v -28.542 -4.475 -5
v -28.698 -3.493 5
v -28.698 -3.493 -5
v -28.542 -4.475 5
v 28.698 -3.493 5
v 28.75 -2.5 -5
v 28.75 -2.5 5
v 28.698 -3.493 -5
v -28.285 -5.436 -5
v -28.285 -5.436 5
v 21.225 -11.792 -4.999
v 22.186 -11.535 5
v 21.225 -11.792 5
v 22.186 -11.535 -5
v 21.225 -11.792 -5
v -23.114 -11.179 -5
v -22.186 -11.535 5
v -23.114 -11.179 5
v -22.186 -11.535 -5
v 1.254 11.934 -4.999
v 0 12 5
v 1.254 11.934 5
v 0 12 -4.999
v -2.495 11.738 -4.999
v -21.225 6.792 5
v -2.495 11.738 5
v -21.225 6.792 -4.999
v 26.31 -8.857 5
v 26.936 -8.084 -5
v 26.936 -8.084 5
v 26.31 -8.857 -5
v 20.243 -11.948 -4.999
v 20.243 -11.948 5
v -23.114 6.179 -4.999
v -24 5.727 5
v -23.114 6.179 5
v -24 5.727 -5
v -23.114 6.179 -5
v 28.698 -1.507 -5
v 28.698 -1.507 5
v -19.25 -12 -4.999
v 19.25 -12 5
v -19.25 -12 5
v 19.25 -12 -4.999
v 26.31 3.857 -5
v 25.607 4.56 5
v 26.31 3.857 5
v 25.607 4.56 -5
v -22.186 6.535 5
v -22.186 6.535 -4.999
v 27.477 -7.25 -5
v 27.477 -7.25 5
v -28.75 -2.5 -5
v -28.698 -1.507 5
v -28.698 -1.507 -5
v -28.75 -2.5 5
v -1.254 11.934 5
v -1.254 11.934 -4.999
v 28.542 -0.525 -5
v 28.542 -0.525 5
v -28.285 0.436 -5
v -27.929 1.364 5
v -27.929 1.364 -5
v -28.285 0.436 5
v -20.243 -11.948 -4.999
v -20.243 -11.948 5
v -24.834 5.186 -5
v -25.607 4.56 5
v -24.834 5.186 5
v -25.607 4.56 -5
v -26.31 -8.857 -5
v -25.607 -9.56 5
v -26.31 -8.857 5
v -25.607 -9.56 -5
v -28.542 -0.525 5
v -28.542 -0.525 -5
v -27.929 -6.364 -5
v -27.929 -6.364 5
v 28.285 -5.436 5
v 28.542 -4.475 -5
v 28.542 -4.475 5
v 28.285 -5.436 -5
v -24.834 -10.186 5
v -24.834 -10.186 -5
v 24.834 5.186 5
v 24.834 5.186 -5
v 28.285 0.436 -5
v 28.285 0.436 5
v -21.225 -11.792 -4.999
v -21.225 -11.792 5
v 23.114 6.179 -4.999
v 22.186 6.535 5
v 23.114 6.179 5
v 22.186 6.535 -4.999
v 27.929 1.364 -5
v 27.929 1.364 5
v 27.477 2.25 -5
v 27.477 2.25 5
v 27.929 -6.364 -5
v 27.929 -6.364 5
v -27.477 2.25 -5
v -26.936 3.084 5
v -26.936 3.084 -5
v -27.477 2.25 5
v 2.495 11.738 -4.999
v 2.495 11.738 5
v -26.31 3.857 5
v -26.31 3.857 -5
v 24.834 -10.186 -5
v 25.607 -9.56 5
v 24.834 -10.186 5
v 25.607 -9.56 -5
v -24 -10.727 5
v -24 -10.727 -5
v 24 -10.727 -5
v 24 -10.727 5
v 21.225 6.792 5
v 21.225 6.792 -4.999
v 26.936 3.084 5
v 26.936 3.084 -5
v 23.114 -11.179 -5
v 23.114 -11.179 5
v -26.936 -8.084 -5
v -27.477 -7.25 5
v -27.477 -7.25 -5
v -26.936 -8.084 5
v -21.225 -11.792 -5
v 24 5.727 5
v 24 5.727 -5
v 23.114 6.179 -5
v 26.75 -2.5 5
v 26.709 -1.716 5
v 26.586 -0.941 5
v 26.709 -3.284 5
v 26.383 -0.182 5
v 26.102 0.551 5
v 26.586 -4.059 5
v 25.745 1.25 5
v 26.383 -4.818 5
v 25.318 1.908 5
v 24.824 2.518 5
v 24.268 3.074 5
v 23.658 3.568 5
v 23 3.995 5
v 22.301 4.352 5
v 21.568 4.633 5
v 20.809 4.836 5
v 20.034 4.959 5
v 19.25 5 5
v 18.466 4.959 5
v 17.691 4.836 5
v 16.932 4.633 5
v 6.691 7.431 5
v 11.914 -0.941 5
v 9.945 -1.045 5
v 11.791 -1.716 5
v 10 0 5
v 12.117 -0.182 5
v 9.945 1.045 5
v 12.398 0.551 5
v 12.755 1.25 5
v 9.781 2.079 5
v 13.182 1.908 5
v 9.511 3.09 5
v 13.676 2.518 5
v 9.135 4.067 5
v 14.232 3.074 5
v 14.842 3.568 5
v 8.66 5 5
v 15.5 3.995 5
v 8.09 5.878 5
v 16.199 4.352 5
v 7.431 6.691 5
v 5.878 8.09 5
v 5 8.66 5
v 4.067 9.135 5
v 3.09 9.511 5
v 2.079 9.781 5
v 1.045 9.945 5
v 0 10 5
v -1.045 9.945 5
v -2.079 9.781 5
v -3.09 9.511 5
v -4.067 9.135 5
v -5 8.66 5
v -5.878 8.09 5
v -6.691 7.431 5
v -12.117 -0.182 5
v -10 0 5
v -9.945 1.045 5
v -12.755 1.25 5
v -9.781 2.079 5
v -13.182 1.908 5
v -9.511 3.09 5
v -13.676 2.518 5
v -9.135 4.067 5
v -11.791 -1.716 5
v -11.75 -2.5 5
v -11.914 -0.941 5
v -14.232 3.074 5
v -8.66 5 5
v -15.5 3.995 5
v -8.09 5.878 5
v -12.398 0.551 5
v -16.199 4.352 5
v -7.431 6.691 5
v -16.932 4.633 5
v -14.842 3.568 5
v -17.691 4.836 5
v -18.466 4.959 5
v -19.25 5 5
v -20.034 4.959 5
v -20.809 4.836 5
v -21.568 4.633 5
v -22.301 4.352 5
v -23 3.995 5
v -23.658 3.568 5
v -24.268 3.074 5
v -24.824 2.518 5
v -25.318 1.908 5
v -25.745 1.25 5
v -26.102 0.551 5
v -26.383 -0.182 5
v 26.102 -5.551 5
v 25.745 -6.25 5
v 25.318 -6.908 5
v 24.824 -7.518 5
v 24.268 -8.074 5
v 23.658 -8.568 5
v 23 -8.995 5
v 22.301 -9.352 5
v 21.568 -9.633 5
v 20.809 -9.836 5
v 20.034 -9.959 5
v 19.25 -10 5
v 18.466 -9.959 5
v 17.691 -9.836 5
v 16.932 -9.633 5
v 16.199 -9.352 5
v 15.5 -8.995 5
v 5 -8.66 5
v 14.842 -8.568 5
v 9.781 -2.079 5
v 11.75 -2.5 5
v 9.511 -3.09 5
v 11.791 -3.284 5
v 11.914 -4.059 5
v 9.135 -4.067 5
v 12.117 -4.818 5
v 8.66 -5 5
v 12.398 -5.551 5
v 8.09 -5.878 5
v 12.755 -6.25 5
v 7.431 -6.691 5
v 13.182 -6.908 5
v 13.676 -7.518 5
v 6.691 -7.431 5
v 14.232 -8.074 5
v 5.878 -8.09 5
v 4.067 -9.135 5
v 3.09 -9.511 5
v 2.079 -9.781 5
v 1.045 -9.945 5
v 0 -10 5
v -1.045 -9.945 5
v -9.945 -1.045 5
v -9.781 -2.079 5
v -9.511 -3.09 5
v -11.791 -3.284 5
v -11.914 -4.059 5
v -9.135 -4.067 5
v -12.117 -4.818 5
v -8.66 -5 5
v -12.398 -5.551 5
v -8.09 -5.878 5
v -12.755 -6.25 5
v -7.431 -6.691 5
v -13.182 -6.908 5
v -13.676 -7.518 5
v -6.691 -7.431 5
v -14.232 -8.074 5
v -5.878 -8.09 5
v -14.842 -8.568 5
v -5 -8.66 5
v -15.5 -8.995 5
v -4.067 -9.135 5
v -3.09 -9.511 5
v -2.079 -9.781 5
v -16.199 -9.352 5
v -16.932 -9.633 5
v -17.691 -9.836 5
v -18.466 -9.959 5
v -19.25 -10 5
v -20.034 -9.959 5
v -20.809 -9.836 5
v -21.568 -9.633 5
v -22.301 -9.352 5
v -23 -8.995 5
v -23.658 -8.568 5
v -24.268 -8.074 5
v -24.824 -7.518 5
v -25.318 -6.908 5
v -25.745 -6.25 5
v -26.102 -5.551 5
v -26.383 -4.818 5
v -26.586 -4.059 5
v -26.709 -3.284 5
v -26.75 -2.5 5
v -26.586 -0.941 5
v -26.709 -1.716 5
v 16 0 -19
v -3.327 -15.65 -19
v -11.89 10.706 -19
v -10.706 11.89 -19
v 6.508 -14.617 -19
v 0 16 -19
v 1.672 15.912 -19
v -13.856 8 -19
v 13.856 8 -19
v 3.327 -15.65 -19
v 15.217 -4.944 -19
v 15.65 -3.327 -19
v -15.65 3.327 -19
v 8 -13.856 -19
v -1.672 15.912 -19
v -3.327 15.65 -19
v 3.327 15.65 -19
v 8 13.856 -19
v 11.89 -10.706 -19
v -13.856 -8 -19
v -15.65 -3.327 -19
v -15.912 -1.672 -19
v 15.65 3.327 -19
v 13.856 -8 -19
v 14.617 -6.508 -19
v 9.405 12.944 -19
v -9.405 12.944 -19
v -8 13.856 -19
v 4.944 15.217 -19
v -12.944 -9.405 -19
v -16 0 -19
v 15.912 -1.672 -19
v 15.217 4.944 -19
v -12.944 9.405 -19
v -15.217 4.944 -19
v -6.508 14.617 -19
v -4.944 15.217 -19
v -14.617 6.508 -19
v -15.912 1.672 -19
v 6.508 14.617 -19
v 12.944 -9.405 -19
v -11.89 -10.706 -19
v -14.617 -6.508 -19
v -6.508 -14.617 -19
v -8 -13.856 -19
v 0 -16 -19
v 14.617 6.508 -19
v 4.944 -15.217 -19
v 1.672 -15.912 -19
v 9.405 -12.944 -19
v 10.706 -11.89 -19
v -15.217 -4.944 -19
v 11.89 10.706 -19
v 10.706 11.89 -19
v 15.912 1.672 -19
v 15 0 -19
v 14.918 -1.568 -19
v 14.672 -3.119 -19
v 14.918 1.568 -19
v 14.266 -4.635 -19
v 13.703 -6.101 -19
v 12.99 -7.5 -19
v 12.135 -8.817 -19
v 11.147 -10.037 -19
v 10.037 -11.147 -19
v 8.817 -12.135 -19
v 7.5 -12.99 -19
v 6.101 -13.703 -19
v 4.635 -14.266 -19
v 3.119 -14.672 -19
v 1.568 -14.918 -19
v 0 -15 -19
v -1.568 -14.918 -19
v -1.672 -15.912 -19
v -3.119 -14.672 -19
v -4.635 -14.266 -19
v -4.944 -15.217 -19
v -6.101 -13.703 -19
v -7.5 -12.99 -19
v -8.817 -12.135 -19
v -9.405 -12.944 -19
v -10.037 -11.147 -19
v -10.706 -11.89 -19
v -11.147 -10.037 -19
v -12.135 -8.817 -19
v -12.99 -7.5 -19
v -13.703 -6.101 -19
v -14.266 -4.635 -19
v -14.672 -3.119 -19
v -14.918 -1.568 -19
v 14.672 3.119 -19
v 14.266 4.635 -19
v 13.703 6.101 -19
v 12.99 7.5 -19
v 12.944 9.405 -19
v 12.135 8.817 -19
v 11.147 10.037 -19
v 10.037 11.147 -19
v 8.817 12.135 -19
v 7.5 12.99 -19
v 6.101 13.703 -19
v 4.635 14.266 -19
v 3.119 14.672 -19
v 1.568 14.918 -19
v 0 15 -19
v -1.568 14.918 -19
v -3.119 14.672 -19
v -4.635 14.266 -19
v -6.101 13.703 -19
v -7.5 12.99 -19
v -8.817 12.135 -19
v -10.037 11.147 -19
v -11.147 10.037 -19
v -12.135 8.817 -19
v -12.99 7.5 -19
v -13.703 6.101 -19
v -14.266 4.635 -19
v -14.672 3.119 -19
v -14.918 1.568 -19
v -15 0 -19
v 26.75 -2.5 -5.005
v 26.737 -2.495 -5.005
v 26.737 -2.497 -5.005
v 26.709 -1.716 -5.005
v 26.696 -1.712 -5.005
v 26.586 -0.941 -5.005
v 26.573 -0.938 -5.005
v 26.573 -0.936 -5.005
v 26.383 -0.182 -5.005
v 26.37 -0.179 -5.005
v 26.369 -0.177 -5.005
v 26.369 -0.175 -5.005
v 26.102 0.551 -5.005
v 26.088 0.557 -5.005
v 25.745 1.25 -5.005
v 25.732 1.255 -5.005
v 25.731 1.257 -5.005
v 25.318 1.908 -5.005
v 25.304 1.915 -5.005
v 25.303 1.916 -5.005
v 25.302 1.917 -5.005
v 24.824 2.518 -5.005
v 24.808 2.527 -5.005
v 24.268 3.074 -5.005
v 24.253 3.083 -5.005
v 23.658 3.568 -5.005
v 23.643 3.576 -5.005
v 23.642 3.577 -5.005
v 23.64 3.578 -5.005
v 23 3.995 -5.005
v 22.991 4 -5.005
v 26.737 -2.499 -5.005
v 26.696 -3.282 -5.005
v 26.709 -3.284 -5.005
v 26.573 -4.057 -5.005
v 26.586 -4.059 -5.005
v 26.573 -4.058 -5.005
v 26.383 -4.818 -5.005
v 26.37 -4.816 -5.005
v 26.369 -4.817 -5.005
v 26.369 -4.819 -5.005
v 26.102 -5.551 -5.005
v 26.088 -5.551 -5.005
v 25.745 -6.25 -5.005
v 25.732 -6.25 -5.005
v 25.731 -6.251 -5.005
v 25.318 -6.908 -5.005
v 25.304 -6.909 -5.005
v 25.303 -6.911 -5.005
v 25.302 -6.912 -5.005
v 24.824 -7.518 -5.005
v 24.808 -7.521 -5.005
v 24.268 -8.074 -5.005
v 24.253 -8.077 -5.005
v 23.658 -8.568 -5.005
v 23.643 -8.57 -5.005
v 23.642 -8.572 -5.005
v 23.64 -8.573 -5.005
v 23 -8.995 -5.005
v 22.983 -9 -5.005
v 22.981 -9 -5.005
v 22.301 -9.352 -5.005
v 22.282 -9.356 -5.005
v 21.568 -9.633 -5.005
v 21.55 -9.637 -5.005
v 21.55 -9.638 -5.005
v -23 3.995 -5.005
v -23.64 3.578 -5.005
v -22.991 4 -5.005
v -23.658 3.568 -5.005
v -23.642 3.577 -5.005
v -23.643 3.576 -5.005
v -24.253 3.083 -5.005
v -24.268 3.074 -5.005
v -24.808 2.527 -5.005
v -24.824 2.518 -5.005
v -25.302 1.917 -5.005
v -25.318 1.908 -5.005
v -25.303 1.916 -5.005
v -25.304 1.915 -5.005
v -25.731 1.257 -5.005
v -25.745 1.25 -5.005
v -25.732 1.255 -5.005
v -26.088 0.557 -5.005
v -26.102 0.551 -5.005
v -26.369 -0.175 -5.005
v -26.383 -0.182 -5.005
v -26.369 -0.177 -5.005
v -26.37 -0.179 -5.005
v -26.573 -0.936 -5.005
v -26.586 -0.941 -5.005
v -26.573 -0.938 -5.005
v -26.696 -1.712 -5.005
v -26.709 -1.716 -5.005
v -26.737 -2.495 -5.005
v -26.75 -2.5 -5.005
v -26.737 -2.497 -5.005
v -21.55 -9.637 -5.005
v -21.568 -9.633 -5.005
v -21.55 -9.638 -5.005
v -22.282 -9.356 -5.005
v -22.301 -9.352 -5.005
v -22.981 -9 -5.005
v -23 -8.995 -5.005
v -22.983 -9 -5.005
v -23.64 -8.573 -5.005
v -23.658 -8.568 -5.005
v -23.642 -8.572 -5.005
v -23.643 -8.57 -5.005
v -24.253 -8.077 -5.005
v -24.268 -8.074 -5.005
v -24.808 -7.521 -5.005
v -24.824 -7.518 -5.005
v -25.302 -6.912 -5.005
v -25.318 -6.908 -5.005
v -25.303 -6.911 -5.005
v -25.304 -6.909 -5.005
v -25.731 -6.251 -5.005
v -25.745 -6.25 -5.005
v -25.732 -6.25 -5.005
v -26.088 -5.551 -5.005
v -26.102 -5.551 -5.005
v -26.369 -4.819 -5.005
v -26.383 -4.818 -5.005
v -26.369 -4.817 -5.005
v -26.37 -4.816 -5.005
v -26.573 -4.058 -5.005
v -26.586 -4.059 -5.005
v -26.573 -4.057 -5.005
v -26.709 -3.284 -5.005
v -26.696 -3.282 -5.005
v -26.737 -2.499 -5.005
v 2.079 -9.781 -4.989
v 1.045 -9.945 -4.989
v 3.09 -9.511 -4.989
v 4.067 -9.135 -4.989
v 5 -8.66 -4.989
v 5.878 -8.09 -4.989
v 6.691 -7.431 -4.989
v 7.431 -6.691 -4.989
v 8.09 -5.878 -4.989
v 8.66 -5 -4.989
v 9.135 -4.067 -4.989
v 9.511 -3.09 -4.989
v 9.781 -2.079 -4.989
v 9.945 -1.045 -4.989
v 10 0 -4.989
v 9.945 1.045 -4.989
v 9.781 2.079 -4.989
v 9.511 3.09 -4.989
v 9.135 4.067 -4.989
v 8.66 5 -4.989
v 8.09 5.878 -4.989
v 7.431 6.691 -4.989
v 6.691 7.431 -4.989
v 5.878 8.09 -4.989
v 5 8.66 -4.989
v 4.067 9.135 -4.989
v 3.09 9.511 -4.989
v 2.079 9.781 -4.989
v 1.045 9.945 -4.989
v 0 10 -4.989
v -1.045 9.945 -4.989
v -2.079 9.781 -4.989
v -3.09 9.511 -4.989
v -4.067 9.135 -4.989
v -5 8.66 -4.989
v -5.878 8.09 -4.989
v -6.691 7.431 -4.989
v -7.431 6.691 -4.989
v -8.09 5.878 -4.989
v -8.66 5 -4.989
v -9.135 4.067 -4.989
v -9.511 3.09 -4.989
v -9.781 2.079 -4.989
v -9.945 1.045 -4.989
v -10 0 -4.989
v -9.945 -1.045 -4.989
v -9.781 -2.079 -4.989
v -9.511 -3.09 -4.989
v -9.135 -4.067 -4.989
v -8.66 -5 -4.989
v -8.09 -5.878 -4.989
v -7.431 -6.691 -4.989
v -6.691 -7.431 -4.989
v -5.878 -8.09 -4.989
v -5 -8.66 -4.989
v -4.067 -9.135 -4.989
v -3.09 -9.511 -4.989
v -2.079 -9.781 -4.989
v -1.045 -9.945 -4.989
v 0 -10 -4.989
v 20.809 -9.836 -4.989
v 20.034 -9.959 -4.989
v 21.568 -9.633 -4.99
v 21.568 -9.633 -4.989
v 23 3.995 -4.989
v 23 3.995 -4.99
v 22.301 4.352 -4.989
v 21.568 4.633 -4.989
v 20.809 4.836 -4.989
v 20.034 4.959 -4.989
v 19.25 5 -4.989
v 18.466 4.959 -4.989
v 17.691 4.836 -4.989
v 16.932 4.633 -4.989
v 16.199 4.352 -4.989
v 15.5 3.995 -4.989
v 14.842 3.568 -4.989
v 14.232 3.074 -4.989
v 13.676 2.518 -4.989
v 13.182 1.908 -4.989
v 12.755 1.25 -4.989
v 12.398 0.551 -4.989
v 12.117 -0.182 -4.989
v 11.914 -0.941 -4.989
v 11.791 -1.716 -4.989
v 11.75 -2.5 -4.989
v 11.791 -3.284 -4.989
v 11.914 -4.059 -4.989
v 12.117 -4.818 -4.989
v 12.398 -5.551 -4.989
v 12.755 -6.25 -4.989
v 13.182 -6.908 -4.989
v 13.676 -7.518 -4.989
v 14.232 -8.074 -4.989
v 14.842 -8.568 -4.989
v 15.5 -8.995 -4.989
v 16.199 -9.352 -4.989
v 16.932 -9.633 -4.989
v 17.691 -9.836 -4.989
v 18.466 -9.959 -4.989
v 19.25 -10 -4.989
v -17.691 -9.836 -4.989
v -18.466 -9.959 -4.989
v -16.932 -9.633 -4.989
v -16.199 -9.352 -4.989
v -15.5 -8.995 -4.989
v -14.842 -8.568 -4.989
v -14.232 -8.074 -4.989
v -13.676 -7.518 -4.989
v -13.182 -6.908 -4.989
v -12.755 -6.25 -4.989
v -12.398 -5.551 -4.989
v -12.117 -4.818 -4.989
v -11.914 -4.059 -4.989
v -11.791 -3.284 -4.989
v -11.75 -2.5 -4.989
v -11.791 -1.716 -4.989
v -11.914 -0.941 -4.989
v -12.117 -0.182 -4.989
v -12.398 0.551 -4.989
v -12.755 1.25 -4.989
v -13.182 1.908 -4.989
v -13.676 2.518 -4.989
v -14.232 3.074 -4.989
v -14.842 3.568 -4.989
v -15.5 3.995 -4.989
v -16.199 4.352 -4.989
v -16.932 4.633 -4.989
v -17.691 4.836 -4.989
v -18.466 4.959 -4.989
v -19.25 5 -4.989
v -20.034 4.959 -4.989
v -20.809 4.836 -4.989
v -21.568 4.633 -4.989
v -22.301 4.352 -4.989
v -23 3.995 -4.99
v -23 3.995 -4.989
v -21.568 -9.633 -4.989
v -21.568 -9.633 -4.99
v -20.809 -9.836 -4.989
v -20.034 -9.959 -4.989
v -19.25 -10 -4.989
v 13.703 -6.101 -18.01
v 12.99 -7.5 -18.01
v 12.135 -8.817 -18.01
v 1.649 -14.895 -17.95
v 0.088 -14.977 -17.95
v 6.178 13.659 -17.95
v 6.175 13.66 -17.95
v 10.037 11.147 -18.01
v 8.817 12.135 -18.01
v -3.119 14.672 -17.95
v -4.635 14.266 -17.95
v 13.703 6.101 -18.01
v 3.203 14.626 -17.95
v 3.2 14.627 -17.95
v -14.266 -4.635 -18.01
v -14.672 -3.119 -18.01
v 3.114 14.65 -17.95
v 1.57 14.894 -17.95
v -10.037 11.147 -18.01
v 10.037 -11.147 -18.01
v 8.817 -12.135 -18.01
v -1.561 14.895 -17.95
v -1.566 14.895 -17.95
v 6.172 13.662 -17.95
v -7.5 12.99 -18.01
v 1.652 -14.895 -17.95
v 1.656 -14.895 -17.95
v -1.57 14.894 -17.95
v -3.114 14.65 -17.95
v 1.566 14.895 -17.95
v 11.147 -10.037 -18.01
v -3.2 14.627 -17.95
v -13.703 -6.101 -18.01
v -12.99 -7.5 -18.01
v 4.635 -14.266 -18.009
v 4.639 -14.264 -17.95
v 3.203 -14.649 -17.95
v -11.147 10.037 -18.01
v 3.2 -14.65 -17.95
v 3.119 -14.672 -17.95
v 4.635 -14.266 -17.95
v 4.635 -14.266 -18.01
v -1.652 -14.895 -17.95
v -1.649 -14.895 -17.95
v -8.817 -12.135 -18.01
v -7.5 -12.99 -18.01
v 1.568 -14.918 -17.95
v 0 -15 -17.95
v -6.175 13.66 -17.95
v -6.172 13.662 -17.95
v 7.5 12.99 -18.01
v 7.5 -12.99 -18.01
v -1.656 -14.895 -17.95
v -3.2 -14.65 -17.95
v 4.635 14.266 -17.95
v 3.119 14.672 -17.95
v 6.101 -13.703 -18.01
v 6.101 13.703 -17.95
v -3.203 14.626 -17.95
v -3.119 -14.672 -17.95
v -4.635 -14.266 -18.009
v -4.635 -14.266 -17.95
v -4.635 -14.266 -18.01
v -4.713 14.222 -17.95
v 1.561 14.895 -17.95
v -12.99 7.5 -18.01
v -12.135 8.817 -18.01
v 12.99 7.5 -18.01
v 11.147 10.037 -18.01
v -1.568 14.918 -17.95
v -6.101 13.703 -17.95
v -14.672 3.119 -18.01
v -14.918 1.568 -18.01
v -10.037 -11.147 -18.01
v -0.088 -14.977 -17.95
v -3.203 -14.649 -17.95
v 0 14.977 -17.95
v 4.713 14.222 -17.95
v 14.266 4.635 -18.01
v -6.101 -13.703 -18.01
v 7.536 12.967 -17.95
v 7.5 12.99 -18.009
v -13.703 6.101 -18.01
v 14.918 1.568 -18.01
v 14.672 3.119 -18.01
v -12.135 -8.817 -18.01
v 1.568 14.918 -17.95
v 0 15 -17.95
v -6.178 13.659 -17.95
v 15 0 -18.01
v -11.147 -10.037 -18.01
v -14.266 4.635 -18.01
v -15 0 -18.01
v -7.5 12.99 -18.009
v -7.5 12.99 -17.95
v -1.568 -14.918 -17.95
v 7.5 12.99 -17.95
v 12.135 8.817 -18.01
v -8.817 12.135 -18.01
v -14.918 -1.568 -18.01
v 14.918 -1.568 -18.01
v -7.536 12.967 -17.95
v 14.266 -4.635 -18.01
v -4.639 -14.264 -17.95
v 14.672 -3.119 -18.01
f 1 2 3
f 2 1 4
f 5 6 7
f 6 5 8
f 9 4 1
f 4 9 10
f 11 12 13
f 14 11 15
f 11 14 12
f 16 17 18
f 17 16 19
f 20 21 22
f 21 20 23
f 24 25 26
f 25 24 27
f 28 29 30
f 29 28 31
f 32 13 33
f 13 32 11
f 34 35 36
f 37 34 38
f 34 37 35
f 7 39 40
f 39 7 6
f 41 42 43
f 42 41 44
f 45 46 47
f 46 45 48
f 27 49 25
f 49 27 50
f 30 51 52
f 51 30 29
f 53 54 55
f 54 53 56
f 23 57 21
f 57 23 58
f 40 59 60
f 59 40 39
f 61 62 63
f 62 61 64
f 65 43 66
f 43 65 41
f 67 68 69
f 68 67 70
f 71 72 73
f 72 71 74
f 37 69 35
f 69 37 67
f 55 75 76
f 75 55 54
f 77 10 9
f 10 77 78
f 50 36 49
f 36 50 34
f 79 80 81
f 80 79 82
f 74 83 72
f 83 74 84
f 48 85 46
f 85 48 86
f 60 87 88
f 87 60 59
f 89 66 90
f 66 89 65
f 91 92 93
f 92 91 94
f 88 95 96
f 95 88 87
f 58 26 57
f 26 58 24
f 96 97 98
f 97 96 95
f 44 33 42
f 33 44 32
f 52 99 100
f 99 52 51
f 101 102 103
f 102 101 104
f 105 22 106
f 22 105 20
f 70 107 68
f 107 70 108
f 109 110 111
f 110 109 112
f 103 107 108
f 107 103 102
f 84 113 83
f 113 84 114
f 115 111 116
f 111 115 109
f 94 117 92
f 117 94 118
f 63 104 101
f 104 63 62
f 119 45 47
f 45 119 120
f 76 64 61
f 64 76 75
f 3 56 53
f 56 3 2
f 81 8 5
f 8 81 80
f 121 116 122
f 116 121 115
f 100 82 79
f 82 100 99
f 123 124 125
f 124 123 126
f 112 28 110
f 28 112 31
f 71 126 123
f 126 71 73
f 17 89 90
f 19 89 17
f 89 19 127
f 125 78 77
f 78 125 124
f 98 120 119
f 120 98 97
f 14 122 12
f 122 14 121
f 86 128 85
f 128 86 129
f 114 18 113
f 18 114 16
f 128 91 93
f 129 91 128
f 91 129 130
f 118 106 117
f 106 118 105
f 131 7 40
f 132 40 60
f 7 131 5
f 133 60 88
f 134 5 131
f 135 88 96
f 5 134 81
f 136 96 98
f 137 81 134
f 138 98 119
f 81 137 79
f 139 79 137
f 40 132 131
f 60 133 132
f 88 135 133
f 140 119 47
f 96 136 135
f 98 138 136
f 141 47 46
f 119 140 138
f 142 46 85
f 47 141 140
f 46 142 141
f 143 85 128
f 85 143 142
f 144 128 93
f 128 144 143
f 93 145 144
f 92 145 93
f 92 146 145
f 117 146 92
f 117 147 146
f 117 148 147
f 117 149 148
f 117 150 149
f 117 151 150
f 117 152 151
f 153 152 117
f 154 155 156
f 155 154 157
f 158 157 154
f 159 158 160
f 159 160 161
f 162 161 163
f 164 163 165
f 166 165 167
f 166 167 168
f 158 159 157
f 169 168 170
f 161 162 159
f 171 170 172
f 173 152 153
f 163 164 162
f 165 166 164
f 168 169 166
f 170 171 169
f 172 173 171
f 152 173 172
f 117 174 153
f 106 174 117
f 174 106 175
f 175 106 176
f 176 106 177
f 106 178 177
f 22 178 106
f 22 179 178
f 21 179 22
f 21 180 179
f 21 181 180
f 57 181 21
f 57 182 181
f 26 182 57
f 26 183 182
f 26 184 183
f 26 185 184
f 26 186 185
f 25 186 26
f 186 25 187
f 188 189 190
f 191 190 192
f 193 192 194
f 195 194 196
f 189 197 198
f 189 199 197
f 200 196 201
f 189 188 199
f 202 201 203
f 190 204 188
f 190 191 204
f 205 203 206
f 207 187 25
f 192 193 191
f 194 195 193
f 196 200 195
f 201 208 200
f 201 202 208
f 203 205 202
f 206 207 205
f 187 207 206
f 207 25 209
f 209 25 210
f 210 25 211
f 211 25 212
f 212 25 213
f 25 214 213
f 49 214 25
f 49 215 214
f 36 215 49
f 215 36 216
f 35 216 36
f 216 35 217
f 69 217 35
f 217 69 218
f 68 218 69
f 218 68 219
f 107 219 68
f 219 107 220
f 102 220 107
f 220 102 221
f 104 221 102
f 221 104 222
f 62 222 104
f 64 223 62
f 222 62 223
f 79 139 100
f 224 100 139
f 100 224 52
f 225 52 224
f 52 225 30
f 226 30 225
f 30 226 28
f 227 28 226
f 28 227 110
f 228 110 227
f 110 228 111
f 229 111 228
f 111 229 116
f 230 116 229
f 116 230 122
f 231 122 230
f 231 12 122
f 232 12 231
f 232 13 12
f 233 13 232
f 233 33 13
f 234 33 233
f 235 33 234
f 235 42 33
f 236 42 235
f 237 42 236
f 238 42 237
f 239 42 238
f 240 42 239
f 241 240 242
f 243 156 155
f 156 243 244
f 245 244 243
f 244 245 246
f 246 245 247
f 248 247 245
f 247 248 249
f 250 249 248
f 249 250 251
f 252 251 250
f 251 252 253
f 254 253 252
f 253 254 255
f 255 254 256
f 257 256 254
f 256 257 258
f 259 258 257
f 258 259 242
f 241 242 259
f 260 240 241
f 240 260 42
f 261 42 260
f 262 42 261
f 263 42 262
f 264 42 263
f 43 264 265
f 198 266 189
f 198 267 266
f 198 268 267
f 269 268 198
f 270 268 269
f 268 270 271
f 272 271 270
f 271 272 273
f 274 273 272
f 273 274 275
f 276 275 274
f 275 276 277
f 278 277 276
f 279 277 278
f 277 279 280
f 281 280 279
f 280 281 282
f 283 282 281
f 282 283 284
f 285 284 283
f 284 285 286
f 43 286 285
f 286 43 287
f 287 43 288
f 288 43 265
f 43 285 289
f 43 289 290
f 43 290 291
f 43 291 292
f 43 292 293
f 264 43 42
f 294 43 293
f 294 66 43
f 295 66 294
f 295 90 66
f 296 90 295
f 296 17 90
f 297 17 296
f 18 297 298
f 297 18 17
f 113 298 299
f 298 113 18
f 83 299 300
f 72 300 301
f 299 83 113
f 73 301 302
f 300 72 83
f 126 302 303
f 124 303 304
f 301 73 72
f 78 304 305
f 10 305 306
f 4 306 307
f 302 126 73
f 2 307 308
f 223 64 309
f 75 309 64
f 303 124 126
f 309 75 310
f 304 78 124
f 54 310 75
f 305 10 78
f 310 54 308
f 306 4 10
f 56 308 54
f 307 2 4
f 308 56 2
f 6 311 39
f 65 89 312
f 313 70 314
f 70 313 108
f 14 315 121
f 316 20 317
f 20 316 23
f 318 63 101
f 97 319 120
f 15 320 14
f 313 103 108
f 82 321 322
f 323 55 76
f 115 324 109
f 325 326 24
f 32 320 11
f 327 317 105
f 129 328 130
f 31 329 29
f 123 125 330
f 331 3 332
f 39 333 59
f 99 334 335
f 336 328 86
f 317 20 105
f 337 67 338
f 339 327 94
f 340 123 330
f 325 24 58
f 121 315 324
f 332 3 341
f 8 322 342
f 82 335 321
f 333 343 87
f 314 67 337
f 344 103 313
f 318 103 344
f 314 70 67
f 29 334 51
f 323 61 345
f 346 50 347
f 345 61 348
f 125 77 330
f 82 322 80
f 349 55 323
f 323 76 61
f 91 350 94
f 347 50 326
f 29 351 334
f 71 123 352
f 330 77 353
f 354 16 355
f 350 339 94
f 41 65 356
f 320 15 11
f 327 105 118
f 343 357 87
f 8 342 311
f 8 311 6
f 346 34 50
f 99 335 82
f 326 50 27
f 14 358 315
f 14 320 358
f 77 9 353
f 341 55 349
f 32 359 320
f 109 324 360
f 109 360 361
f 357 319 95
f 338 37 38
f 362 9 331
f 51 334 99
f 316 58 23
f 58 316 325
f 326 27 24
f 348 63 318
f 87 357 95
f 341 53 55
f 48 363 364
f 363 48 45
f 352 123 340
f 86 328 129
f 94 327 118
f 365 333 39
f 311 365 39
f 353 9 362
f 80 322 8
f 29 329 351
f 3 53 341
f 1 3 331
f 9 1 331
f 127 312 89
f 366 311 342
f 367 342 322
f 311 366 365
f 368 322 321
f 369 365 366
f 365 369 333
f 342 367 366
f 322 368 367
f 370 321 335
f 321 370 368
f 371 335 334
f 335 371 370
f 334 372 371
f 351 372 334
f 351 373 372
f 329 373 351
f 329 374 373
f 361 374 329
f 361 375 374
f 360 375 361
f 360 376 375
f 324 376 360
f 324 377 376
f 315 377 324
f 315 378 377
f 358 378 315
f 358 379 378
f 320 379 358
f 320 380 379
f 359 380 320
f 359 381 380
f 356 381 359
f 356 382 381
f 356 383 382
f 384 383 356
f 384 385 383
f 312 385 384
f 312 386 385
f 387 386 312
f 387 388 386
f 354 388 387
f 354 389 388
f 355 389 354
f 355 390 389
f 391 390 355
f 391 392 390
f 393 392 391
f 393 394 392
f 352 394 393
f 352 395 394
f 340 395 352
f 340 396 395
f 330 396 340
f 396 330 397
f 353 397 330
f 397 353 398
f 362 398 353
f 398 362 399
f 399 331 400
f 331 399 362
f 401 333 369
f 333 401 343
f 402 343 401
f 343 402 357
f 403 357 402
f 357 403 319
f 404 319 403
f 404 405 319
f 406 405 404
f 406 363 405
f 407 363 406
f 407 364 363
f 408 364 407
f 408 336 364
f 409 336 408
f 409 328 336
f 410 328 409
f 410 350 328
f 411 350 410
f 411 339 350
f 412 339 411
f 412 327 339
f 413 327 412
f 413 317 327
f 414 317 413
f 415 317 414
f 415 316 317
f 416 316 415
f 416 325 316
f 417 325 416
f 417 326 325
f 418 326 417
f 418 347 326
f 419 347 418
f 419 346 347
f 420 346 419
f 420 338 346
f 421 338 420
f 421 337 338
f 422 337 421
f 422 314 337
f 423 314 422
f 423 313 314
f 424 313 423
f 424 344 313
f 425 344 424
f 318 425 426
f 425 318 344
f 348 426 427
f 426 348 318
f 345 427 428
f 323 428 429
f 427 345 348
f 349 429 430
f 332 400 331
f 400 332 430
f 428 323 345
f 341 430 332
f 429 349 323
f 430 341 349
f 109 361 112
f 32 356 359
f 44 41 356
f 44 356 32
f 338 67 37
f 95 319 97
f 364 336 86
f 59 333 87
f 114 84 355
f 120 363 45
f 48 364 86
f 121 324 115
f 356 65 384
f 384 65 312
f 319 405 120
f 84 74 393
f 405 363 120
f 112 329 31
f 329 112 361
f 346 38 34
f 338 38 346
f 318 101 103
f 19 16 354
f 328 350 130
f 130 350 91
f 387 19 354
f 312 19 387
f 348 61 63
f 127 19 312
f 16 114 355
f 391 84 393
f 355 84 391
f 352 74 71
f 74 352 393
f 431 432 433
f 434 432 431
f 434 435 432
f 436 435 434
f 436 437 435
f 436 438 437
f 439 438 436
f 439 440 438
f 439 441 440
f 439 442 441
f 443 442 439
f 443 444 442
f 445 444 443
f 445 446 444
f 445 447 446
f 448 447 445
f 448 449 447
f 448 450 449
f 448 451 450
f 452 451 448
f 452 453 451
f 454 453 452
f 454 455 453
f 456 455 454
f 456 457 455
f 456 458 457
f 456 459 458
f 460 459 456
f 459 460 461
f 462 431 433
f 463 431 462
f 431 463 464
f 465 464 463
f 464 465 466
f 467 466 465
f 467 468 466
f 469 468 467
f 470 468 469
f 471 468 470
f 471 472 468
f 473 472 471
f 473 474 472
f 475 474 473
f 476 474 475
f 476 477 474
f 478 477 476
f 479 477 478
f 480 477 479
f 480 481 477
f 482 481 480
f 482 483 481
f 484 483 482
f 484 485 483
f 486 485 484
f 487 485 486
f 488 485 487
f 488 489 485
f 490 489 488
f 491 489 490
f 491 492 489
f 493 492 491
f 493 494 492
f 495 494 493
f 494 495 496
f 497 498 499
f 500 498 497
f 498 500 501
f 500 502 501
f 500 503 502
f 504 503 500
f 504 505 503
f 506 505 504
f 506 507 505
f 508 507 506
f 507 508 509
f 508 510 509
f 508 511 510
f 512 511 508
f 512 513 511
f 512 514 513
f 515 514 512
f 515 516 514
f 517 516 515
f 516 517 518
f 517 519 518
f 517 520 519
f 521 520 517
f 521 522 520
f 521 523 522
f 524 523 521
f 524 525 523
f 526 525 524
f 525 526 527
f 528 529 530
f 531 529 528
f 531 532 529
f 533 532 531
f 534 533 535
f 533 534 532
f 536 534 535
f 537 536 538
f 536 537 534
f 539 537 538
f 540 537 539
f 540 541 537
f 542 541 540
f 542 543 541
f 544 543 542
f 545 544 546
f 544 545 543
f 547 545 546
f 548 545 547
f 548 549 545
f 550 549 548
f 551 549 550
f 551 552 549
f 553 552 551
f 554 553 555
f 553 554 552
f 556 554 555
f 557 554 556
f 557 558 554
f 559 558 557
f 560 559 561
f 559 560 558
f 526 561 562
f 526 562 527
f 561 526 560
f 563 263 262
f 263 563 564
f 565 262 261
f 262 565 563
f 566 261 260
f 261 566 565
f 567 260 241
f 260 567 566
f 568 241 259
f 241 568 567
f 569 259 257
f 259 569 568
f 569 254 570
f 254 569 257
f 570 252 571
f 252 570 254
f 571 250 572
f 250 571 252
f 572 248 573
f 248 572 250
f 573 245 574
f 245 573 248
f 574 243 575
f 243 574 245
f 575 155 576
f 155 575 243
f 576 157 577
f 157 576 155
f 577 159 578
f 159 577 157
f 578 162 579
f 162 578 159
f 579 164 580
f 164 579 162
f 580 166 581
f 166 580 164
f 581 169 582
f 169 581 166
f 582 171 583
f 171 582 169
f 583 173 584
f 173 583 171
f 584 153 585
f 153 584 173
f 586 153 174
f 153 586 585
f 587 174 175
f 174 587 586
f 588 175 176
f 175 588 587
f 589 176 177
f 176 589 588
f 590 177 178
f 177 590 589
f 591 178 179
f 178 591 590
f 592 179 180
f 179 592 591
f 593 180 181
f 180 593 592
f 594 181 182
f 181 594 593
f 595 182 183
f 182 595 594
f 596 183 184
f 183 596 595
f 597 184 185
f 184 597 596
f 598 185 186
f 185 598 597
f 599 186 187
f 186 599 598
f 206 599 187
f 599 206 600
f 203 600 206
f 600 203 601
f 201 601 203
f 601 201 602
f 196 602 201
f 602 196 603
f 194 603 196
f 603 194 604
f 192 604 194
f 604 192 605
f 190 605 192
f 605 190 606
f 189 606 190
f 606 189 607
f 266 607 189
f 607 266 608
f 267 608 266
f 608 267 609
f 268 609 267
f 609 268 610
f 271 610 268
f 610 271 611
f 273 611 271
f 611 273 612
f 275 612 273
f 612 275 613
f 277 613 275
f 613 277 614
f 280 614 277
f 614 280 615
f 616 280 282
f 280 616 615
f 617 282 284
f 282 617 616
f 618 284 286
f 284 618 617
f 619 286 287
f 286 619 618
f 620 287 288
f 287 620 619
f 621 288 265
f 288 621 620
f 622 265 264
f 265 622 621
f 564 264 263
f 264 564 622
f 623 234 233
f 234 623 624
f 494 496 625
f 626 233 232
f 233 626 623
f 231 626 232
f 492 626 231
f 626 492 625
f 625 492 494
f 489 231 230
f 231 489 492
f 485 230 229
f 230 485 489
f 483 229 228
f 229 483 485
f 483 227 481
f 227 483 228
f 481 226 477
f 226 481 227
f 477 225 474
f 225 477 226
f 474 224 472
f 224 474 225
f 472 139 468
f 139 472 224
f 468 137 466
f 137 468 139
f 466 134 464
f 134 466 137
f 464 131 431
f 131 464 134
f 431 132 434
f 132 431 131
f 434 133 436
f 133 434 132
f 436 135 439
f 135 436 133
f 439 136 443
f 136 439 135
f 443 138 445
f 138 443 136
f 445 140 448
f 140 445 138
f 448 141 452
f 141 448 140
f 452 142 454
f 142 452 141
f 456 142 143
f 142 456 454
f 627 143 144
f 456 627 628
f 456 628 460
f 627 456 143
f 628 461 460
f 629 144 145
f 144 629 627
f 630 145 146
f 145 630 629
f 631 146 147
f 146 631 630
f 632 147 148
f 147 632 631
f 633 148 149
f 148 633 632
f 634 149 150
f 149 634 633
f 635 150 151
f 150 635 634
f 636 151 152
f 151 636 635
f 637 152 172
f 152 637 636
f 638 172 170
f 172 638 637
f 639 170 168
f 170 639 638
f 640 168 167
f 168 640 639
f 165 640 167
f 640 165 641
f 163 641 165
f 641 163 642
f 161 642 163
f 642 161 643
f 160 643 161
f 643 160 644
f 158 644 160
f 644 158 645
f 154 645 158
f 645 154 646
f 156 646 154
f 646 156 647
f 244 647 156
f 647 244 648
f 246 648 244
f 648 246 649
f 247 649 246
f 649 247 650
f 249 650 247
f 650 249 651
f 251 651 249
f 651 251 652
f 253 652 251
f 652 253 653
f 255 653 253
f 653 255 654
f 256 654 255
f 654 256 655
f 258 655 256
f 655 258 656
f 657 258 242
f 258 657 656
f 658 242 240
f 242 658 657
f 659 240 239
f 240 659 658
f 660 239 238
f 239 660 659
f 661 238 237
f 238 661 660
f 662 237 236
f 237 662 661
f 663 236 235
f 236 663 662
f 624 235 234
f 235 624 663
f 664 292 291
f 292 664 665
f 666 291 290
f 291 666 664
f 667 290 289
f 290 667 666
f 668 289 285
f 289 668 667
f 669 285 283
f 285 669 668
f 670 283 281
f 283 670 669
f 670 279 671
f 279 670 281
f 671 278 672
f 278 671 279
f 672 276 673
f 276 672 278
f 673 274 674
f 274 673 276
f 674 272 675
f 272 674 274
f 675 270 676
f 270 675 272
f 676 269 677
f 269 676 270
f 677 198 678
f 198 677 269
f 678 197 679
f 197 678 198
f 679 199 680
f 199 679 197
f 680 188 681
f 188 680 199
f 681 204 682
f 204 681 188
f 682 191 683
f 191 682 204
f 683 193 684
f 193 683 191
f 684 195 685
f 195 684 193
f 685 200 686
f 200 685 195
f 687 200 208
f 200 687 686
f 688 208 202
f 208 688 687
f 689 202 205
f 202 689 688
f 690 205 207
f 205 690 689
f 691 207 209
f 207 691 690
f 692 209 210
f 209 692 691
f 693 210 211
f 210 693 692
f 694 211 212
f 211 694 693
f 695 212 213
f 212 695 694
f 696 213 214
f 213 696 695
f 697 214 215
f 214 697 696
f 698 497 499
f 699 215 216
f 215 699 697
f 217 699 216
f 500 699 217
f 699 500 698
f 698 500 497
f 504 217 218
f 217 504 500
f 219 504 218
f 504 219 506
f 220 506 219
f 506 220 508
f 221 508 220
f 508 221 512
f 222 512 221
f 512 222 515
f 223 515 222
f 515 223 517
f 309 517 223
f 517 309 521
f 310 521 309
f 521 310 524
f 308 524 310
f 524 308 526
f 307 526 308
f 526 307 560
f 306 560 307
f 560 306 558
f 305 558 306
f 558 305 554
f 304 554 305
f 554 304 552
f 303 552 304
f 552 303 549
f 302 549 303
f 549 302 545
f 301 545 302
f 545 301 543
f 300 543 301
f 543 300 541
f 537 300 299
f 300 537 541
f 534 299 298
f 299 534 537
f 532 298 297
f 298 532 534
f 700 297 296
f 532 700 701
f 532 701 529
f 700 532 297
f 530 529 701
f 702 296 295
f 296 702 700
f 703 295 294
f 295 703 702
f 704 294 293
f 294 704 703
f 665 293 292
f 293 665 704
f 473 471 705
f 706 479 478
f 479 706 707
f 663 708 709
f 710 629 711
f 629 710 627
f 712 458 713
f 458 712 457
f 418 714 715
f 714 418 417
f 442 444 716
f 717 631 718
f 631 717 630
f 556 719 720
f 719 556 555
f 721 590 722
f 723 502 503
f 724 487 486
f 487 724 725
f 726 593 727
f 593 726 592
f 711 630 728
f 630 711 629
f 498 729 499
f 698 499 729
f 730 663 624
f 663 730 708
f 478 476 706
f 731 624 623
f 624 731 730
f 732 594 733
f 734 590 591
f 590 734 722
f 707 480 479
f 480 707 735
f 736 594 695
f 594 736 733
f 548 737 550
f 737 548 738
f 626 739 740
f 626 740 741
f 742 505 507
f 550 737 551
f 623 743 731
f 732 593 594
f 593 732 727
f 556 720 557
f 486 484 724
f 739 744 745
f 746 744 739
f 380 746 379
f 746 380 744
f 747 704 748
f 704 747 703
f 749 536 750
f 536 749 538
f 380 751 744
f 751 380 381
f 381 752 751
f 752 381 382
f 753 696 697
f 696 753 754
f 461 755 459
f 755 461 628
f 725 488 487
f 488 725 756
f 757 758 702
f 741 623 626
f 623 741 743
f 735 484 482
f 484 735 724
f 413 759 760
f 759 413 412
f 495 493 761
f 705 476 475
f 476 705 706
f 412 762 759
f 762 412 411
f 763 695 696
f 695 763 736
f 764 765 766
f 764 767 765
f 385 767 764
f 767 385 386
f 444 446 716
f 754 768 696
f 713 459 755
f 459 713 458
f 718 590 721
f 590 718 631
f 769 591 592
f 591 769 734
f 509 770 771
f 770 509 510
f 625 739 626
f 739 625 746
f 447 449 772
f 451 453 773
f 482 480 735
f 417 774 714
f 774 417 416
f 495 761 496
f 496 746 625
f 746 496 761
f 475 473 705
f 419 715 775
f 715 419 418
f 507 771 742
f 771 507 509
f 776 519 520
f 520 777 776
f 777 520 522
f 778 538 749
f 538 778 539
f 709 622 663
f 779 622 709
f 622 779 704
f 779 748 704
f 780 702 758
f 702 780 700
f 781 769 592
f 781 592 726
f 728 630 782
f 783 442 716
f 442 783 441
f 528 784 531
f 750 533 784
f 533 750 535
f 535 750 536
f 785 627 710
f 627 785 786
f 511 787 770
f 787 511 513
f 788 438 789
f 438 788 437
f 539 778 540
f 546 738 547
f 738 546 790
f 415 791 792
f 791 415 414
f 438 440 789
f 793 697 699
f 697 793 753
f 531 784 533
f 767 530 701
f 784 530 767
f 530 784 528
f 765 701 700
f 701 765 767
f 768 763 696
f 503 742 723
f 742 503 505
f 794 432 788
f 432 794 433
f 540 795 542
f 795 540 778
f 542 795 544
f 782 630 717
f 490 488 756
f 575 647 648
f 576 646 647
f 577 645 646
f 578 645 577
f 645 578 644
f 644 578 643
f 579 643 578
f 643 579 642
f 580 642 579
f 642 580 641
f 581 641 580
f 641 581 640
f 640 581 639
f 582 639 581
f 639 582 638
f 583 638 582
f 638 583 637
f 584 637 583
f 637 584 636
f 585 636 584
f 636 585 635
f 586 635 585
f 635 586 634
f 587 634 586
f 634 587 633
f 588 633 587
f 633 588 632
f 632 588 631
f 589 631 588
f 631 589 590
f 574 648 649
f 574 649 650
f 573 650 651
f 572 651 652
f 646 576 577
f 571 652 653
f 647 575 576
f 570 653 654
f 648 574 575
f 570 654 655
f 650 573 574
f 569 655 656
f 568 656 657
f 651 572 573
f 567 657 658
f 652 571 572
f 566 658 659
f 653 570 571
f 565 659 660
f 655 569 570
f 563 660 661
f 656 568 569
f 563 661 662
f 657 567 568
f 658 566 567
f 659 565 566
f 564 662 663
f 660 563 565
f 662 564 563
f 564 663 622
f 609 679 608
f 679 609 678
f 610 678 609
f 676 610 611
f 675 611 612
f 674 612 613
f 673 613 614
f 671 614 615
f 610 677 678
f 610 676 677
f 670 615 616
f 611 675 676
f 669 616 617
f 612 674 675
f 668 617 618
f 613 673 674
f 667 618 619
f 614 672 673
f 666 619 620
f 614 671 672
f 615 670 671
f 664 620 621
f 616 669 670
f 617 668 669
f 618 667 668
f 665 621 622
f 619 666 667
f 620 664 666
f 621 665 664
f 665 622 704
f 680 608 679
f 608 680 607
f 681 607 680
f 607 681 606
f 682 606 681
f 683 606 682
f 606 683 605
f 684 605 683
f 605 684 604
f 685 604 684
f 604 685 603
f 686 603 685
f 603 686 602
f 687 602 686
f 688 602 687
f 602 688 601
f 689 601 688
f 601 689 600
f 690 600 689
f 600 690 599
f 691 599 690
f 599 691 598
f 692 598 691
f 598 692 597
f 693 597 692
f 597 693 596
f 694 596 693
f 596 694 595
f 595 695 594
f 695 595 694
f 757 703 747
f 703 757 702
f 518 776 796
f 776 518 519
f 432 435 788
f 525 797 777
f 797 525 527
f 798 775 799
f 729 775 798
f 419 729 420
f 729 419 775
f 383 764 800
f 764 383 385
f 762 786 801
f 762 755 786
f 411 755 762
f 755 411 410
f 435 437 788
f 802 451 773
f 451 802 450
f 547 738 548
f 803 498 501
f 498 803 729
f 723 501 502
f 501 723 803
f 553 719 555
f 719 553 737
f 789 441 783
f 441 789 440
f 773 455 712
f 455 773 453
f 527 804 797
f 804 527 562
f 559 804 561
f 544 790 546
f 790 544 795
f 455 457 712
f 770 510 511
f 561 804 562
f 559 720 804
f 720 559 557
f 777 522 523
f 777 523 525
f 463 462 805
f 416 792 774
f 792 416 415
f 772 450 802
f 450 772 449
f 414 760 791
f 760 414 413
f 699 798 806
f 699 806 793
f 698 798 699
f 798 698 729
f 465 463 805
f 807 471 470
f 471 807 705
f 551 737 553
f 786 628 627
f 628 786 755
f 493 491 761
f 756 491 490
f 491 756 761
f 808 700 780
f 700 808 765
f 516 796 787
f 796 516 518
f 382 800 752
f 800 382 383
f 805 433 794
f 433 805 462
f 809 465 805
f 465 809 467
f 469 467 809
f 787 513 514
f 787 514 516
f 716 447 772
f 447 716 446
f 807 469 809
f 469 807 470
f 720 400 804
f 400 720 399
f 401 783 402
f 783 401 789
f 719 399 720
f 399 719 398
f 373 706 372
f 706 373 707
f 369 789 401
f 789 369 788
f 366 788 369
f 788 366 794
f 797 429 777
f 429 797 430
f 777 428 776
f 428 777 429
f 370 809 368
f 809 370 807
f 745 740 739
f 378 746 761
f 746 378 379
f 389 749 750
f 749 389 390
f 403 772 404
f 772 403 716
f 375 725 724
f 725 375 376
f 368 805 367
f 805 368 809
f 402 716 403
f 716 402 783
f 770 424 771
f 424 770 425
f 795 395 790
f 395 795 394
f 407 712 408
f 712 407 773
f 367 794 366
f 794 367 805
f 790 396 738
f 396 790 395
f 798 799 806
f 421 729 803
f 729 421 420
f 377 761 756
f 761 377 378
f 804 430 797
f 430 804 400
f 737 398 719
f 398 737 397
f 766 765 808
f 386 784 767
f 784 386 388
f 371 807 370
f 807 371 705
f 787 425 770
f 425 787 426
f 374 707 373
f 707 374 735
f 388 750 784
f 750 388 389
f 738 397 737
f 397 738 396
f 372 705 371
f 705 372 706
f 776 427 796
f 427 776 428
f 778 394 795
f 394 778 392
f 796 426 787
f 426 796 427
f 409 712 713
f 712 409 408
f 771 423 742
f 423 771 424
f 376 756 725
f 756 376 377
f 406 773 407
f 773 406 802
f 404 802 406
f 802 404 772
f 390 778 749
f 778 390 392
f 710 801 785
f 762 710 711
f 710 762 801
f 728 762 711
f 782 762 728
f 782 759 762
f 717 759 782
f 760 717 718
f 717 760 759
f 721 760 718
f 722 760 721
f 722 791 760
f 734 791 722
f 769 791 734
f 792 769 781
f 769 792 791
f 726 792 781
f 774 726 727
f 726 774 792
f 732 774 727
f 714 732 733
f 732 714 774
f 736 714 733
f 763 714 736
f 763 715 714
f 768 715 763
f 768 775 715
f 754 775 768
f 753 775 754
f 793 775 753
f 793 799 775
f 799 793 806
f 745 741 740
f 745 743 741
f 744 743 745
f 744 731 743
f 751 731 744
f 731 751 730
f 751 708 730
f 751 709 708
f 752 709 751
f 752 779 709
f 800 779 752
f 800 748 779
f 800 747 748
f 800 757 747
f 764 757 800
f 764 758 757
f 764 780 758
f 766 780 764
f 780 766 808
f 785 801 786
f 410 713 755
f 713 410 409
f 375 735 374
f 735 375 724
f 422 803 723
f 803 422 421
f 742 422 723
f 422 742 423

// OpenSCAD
dremel_accessory_diam = 20;
dremel_accesory_height = 12-2;

aspirator_thickness_thick = 2;
aspirator_thickness_slim = 1;
aspirator_thickness_screw = aspirator_thickness_slim;

aspirator_tube_diam = 15;
aspirator_tube_holder_height = 15;

aspirator_hole_height = 15+5-6;
aspirator_hole_diam = 30;

dremel_wrench_diam = 0;
dremel_wrench_hole_offset = 8;

dremel_accessory_screw_separation = dremel_accessory_diam+aspirator_thickness_screw+1.25;
dremel_accessory_angle = 8;

dremel_accessory_tube_offset = dremel_accessory_diam-aspirator_tube_diam;
aspirator_tube_separation = dremel_accessory_diam+aspirator_tube_diam+aspirator_thickness_screw*2+1.5;
dremel_accessory_hole_offset = 0;//dremel_accessory_diam-aspirator_hole_diam;

// Useful MCAD functions reference

//use <MCAD/motors.scad>
//stepper_motor_mount(nema_standard=17, slide_distance=10, $fn=40, mochup=true);

//use <MCAD/boxes.scad>
//roundedBox([10,20,30], radius=2, sidesonly=false, $fn=60);

//include <MCAD/stepper.scad>
//motor(Nema17, size=NemaMedium, dualAxis=false);


//use <MCAD/teardrop.scad>
//teardrop(radius=10, length=20, angle=90);

//use <MCAD/nuts_and_bolts.scad>
//nutHole(size=3, tolerance=0.5, proj=-1);
//boltHole(size=3, length=10, tolerance=0.5, proj=-1, $fn=40);

use <MCAD/teardrop.scad>
use <MCAD/nuts_and_bolts.scad>

module aspirator_accessory_2Dshape() {
	hull() {
		translate([aspirator_tube_separation/2,-dremel_accessory_tube_offset/2])
			circle(r=aspirator_thickness_thick+aspirator_tube_diam/2, h=dremel_accesory_height, $fn=60);
		circle(r=aspirator_thickness_thick+dremel_accessory_diam/2, h=dremel_accesory_height, $fn=60);
		translate([-aspirator_tube_separation/2,-dremel_accessory_tube_offset/2])
			circle(r=aspirator_thickness_thick+aspirator_tube_diam/2, h=dremel_accesory_height, $fn=60);
	}
}

module aspirator_accessory_filledshape() {
	linear_extrude(height=dremel_accesory_height,center=true)
		aspirator_accessory_2Dshape();
	hull() {
		translate([0,0,-dremel_accesory_height/2])
			linear_extrude(height=0.001,center=true)
				aspirator_accessory_2Dshape();
		translate([0,dremel_accessory_hole_offset/2,-dremel_accesory_height/2-aspirator_hole_height])
			linear_extrude(height=0.001,center=true)
				circle(r=aspirator_thickness_slim+aspirator_hole_diam/2, $fn=60);
	}
}

module aspirator_accessory_2Dholes() {
	translate([aspirator_tube_separation/2,-dremel_accessory_tube_offset/2])
		circle(r=aspirator_tube_diam/2, $fn=60);
	circle(r=dremel_accessory_diam/2, $fn=60);
	translate([-aspirator_tube_separation/2,-dremel_accessory_tube_offset/2])
		circle(r=aspirator_tube_diam/2, $fn=60);
}

module screwHole() {
	translate([0,-7,0])
		rotate([90,0,0])
		hull() {
		translate([0,0,20])
			nutHole(size=3, tolerance=0.5, proj=-1);
		nutHole(size=3, tolerance=0.5, proj=-1);
		}
	translate([0,7,0])
		rotate([90,0,0])
			boltHole(size=3, length=30, tolerance=0.4, proj=-1, $fn=40);
}

module aspirator_accessory_holes() {
	linear_extrude(height=dremel_accesory_height+0.01,center=true)
		aspirator_accessory_2Dholes();
	hull() {
		translate([0,0,-dremel_accesory_height/2+0.01])
			linear_extrude(height=0.001,center=true)
				aspirator_accessory_2Dholes();
		translate([0,dremel_accessory_hole_offset/2,-dremel_accesory_height/2-aspirator_hole_height+1-0.01])
			linear_extrude(height=0.001,center=true)
				circle(r=aspirator_hole_diam/2, $fn=60);
	}
	translate([0,dremel_accessory_hole_offset/2,-dremel_accesory_height/2-aspirator_hole_height])
			linear_extrude(height=2+0.1,center=true)
				circle(r=aspirator_hole_diam/2, $fn=60);
	// Hole for the tightener
	*translate([0,-dremel_accessory_tube_offset/4,0])
		cube([aspirator_tube_separation,1,dremel_accesory_height+0.01],center=true);
	// Frontal hole for the wrench
	*translate([0,(dremel_accessory_diam+aspirator_thickness_thick)/2,-(dremel_accesory_height+aspirator_hole_height)/2-dremel_wrench_hole_offset])
		cube([dremel_wrench_diam,10,aspirator_hole_height+0.01],center=true);
	// Holes for the nut/screws
	*translate([dremel_accessory_screw_separation/2,0,0])
		rotate([0,0,-dremel_accessory_angle])
			screwHole();
	*translate([-dremel_accessory_screw_separation/2,0,0])
		rotate([0,0,dremel_accessory_angle])
			screwHole();
}

difference() {
	aspirator_accessory_filledshape();
	aspirator_accessory_holes();
}
